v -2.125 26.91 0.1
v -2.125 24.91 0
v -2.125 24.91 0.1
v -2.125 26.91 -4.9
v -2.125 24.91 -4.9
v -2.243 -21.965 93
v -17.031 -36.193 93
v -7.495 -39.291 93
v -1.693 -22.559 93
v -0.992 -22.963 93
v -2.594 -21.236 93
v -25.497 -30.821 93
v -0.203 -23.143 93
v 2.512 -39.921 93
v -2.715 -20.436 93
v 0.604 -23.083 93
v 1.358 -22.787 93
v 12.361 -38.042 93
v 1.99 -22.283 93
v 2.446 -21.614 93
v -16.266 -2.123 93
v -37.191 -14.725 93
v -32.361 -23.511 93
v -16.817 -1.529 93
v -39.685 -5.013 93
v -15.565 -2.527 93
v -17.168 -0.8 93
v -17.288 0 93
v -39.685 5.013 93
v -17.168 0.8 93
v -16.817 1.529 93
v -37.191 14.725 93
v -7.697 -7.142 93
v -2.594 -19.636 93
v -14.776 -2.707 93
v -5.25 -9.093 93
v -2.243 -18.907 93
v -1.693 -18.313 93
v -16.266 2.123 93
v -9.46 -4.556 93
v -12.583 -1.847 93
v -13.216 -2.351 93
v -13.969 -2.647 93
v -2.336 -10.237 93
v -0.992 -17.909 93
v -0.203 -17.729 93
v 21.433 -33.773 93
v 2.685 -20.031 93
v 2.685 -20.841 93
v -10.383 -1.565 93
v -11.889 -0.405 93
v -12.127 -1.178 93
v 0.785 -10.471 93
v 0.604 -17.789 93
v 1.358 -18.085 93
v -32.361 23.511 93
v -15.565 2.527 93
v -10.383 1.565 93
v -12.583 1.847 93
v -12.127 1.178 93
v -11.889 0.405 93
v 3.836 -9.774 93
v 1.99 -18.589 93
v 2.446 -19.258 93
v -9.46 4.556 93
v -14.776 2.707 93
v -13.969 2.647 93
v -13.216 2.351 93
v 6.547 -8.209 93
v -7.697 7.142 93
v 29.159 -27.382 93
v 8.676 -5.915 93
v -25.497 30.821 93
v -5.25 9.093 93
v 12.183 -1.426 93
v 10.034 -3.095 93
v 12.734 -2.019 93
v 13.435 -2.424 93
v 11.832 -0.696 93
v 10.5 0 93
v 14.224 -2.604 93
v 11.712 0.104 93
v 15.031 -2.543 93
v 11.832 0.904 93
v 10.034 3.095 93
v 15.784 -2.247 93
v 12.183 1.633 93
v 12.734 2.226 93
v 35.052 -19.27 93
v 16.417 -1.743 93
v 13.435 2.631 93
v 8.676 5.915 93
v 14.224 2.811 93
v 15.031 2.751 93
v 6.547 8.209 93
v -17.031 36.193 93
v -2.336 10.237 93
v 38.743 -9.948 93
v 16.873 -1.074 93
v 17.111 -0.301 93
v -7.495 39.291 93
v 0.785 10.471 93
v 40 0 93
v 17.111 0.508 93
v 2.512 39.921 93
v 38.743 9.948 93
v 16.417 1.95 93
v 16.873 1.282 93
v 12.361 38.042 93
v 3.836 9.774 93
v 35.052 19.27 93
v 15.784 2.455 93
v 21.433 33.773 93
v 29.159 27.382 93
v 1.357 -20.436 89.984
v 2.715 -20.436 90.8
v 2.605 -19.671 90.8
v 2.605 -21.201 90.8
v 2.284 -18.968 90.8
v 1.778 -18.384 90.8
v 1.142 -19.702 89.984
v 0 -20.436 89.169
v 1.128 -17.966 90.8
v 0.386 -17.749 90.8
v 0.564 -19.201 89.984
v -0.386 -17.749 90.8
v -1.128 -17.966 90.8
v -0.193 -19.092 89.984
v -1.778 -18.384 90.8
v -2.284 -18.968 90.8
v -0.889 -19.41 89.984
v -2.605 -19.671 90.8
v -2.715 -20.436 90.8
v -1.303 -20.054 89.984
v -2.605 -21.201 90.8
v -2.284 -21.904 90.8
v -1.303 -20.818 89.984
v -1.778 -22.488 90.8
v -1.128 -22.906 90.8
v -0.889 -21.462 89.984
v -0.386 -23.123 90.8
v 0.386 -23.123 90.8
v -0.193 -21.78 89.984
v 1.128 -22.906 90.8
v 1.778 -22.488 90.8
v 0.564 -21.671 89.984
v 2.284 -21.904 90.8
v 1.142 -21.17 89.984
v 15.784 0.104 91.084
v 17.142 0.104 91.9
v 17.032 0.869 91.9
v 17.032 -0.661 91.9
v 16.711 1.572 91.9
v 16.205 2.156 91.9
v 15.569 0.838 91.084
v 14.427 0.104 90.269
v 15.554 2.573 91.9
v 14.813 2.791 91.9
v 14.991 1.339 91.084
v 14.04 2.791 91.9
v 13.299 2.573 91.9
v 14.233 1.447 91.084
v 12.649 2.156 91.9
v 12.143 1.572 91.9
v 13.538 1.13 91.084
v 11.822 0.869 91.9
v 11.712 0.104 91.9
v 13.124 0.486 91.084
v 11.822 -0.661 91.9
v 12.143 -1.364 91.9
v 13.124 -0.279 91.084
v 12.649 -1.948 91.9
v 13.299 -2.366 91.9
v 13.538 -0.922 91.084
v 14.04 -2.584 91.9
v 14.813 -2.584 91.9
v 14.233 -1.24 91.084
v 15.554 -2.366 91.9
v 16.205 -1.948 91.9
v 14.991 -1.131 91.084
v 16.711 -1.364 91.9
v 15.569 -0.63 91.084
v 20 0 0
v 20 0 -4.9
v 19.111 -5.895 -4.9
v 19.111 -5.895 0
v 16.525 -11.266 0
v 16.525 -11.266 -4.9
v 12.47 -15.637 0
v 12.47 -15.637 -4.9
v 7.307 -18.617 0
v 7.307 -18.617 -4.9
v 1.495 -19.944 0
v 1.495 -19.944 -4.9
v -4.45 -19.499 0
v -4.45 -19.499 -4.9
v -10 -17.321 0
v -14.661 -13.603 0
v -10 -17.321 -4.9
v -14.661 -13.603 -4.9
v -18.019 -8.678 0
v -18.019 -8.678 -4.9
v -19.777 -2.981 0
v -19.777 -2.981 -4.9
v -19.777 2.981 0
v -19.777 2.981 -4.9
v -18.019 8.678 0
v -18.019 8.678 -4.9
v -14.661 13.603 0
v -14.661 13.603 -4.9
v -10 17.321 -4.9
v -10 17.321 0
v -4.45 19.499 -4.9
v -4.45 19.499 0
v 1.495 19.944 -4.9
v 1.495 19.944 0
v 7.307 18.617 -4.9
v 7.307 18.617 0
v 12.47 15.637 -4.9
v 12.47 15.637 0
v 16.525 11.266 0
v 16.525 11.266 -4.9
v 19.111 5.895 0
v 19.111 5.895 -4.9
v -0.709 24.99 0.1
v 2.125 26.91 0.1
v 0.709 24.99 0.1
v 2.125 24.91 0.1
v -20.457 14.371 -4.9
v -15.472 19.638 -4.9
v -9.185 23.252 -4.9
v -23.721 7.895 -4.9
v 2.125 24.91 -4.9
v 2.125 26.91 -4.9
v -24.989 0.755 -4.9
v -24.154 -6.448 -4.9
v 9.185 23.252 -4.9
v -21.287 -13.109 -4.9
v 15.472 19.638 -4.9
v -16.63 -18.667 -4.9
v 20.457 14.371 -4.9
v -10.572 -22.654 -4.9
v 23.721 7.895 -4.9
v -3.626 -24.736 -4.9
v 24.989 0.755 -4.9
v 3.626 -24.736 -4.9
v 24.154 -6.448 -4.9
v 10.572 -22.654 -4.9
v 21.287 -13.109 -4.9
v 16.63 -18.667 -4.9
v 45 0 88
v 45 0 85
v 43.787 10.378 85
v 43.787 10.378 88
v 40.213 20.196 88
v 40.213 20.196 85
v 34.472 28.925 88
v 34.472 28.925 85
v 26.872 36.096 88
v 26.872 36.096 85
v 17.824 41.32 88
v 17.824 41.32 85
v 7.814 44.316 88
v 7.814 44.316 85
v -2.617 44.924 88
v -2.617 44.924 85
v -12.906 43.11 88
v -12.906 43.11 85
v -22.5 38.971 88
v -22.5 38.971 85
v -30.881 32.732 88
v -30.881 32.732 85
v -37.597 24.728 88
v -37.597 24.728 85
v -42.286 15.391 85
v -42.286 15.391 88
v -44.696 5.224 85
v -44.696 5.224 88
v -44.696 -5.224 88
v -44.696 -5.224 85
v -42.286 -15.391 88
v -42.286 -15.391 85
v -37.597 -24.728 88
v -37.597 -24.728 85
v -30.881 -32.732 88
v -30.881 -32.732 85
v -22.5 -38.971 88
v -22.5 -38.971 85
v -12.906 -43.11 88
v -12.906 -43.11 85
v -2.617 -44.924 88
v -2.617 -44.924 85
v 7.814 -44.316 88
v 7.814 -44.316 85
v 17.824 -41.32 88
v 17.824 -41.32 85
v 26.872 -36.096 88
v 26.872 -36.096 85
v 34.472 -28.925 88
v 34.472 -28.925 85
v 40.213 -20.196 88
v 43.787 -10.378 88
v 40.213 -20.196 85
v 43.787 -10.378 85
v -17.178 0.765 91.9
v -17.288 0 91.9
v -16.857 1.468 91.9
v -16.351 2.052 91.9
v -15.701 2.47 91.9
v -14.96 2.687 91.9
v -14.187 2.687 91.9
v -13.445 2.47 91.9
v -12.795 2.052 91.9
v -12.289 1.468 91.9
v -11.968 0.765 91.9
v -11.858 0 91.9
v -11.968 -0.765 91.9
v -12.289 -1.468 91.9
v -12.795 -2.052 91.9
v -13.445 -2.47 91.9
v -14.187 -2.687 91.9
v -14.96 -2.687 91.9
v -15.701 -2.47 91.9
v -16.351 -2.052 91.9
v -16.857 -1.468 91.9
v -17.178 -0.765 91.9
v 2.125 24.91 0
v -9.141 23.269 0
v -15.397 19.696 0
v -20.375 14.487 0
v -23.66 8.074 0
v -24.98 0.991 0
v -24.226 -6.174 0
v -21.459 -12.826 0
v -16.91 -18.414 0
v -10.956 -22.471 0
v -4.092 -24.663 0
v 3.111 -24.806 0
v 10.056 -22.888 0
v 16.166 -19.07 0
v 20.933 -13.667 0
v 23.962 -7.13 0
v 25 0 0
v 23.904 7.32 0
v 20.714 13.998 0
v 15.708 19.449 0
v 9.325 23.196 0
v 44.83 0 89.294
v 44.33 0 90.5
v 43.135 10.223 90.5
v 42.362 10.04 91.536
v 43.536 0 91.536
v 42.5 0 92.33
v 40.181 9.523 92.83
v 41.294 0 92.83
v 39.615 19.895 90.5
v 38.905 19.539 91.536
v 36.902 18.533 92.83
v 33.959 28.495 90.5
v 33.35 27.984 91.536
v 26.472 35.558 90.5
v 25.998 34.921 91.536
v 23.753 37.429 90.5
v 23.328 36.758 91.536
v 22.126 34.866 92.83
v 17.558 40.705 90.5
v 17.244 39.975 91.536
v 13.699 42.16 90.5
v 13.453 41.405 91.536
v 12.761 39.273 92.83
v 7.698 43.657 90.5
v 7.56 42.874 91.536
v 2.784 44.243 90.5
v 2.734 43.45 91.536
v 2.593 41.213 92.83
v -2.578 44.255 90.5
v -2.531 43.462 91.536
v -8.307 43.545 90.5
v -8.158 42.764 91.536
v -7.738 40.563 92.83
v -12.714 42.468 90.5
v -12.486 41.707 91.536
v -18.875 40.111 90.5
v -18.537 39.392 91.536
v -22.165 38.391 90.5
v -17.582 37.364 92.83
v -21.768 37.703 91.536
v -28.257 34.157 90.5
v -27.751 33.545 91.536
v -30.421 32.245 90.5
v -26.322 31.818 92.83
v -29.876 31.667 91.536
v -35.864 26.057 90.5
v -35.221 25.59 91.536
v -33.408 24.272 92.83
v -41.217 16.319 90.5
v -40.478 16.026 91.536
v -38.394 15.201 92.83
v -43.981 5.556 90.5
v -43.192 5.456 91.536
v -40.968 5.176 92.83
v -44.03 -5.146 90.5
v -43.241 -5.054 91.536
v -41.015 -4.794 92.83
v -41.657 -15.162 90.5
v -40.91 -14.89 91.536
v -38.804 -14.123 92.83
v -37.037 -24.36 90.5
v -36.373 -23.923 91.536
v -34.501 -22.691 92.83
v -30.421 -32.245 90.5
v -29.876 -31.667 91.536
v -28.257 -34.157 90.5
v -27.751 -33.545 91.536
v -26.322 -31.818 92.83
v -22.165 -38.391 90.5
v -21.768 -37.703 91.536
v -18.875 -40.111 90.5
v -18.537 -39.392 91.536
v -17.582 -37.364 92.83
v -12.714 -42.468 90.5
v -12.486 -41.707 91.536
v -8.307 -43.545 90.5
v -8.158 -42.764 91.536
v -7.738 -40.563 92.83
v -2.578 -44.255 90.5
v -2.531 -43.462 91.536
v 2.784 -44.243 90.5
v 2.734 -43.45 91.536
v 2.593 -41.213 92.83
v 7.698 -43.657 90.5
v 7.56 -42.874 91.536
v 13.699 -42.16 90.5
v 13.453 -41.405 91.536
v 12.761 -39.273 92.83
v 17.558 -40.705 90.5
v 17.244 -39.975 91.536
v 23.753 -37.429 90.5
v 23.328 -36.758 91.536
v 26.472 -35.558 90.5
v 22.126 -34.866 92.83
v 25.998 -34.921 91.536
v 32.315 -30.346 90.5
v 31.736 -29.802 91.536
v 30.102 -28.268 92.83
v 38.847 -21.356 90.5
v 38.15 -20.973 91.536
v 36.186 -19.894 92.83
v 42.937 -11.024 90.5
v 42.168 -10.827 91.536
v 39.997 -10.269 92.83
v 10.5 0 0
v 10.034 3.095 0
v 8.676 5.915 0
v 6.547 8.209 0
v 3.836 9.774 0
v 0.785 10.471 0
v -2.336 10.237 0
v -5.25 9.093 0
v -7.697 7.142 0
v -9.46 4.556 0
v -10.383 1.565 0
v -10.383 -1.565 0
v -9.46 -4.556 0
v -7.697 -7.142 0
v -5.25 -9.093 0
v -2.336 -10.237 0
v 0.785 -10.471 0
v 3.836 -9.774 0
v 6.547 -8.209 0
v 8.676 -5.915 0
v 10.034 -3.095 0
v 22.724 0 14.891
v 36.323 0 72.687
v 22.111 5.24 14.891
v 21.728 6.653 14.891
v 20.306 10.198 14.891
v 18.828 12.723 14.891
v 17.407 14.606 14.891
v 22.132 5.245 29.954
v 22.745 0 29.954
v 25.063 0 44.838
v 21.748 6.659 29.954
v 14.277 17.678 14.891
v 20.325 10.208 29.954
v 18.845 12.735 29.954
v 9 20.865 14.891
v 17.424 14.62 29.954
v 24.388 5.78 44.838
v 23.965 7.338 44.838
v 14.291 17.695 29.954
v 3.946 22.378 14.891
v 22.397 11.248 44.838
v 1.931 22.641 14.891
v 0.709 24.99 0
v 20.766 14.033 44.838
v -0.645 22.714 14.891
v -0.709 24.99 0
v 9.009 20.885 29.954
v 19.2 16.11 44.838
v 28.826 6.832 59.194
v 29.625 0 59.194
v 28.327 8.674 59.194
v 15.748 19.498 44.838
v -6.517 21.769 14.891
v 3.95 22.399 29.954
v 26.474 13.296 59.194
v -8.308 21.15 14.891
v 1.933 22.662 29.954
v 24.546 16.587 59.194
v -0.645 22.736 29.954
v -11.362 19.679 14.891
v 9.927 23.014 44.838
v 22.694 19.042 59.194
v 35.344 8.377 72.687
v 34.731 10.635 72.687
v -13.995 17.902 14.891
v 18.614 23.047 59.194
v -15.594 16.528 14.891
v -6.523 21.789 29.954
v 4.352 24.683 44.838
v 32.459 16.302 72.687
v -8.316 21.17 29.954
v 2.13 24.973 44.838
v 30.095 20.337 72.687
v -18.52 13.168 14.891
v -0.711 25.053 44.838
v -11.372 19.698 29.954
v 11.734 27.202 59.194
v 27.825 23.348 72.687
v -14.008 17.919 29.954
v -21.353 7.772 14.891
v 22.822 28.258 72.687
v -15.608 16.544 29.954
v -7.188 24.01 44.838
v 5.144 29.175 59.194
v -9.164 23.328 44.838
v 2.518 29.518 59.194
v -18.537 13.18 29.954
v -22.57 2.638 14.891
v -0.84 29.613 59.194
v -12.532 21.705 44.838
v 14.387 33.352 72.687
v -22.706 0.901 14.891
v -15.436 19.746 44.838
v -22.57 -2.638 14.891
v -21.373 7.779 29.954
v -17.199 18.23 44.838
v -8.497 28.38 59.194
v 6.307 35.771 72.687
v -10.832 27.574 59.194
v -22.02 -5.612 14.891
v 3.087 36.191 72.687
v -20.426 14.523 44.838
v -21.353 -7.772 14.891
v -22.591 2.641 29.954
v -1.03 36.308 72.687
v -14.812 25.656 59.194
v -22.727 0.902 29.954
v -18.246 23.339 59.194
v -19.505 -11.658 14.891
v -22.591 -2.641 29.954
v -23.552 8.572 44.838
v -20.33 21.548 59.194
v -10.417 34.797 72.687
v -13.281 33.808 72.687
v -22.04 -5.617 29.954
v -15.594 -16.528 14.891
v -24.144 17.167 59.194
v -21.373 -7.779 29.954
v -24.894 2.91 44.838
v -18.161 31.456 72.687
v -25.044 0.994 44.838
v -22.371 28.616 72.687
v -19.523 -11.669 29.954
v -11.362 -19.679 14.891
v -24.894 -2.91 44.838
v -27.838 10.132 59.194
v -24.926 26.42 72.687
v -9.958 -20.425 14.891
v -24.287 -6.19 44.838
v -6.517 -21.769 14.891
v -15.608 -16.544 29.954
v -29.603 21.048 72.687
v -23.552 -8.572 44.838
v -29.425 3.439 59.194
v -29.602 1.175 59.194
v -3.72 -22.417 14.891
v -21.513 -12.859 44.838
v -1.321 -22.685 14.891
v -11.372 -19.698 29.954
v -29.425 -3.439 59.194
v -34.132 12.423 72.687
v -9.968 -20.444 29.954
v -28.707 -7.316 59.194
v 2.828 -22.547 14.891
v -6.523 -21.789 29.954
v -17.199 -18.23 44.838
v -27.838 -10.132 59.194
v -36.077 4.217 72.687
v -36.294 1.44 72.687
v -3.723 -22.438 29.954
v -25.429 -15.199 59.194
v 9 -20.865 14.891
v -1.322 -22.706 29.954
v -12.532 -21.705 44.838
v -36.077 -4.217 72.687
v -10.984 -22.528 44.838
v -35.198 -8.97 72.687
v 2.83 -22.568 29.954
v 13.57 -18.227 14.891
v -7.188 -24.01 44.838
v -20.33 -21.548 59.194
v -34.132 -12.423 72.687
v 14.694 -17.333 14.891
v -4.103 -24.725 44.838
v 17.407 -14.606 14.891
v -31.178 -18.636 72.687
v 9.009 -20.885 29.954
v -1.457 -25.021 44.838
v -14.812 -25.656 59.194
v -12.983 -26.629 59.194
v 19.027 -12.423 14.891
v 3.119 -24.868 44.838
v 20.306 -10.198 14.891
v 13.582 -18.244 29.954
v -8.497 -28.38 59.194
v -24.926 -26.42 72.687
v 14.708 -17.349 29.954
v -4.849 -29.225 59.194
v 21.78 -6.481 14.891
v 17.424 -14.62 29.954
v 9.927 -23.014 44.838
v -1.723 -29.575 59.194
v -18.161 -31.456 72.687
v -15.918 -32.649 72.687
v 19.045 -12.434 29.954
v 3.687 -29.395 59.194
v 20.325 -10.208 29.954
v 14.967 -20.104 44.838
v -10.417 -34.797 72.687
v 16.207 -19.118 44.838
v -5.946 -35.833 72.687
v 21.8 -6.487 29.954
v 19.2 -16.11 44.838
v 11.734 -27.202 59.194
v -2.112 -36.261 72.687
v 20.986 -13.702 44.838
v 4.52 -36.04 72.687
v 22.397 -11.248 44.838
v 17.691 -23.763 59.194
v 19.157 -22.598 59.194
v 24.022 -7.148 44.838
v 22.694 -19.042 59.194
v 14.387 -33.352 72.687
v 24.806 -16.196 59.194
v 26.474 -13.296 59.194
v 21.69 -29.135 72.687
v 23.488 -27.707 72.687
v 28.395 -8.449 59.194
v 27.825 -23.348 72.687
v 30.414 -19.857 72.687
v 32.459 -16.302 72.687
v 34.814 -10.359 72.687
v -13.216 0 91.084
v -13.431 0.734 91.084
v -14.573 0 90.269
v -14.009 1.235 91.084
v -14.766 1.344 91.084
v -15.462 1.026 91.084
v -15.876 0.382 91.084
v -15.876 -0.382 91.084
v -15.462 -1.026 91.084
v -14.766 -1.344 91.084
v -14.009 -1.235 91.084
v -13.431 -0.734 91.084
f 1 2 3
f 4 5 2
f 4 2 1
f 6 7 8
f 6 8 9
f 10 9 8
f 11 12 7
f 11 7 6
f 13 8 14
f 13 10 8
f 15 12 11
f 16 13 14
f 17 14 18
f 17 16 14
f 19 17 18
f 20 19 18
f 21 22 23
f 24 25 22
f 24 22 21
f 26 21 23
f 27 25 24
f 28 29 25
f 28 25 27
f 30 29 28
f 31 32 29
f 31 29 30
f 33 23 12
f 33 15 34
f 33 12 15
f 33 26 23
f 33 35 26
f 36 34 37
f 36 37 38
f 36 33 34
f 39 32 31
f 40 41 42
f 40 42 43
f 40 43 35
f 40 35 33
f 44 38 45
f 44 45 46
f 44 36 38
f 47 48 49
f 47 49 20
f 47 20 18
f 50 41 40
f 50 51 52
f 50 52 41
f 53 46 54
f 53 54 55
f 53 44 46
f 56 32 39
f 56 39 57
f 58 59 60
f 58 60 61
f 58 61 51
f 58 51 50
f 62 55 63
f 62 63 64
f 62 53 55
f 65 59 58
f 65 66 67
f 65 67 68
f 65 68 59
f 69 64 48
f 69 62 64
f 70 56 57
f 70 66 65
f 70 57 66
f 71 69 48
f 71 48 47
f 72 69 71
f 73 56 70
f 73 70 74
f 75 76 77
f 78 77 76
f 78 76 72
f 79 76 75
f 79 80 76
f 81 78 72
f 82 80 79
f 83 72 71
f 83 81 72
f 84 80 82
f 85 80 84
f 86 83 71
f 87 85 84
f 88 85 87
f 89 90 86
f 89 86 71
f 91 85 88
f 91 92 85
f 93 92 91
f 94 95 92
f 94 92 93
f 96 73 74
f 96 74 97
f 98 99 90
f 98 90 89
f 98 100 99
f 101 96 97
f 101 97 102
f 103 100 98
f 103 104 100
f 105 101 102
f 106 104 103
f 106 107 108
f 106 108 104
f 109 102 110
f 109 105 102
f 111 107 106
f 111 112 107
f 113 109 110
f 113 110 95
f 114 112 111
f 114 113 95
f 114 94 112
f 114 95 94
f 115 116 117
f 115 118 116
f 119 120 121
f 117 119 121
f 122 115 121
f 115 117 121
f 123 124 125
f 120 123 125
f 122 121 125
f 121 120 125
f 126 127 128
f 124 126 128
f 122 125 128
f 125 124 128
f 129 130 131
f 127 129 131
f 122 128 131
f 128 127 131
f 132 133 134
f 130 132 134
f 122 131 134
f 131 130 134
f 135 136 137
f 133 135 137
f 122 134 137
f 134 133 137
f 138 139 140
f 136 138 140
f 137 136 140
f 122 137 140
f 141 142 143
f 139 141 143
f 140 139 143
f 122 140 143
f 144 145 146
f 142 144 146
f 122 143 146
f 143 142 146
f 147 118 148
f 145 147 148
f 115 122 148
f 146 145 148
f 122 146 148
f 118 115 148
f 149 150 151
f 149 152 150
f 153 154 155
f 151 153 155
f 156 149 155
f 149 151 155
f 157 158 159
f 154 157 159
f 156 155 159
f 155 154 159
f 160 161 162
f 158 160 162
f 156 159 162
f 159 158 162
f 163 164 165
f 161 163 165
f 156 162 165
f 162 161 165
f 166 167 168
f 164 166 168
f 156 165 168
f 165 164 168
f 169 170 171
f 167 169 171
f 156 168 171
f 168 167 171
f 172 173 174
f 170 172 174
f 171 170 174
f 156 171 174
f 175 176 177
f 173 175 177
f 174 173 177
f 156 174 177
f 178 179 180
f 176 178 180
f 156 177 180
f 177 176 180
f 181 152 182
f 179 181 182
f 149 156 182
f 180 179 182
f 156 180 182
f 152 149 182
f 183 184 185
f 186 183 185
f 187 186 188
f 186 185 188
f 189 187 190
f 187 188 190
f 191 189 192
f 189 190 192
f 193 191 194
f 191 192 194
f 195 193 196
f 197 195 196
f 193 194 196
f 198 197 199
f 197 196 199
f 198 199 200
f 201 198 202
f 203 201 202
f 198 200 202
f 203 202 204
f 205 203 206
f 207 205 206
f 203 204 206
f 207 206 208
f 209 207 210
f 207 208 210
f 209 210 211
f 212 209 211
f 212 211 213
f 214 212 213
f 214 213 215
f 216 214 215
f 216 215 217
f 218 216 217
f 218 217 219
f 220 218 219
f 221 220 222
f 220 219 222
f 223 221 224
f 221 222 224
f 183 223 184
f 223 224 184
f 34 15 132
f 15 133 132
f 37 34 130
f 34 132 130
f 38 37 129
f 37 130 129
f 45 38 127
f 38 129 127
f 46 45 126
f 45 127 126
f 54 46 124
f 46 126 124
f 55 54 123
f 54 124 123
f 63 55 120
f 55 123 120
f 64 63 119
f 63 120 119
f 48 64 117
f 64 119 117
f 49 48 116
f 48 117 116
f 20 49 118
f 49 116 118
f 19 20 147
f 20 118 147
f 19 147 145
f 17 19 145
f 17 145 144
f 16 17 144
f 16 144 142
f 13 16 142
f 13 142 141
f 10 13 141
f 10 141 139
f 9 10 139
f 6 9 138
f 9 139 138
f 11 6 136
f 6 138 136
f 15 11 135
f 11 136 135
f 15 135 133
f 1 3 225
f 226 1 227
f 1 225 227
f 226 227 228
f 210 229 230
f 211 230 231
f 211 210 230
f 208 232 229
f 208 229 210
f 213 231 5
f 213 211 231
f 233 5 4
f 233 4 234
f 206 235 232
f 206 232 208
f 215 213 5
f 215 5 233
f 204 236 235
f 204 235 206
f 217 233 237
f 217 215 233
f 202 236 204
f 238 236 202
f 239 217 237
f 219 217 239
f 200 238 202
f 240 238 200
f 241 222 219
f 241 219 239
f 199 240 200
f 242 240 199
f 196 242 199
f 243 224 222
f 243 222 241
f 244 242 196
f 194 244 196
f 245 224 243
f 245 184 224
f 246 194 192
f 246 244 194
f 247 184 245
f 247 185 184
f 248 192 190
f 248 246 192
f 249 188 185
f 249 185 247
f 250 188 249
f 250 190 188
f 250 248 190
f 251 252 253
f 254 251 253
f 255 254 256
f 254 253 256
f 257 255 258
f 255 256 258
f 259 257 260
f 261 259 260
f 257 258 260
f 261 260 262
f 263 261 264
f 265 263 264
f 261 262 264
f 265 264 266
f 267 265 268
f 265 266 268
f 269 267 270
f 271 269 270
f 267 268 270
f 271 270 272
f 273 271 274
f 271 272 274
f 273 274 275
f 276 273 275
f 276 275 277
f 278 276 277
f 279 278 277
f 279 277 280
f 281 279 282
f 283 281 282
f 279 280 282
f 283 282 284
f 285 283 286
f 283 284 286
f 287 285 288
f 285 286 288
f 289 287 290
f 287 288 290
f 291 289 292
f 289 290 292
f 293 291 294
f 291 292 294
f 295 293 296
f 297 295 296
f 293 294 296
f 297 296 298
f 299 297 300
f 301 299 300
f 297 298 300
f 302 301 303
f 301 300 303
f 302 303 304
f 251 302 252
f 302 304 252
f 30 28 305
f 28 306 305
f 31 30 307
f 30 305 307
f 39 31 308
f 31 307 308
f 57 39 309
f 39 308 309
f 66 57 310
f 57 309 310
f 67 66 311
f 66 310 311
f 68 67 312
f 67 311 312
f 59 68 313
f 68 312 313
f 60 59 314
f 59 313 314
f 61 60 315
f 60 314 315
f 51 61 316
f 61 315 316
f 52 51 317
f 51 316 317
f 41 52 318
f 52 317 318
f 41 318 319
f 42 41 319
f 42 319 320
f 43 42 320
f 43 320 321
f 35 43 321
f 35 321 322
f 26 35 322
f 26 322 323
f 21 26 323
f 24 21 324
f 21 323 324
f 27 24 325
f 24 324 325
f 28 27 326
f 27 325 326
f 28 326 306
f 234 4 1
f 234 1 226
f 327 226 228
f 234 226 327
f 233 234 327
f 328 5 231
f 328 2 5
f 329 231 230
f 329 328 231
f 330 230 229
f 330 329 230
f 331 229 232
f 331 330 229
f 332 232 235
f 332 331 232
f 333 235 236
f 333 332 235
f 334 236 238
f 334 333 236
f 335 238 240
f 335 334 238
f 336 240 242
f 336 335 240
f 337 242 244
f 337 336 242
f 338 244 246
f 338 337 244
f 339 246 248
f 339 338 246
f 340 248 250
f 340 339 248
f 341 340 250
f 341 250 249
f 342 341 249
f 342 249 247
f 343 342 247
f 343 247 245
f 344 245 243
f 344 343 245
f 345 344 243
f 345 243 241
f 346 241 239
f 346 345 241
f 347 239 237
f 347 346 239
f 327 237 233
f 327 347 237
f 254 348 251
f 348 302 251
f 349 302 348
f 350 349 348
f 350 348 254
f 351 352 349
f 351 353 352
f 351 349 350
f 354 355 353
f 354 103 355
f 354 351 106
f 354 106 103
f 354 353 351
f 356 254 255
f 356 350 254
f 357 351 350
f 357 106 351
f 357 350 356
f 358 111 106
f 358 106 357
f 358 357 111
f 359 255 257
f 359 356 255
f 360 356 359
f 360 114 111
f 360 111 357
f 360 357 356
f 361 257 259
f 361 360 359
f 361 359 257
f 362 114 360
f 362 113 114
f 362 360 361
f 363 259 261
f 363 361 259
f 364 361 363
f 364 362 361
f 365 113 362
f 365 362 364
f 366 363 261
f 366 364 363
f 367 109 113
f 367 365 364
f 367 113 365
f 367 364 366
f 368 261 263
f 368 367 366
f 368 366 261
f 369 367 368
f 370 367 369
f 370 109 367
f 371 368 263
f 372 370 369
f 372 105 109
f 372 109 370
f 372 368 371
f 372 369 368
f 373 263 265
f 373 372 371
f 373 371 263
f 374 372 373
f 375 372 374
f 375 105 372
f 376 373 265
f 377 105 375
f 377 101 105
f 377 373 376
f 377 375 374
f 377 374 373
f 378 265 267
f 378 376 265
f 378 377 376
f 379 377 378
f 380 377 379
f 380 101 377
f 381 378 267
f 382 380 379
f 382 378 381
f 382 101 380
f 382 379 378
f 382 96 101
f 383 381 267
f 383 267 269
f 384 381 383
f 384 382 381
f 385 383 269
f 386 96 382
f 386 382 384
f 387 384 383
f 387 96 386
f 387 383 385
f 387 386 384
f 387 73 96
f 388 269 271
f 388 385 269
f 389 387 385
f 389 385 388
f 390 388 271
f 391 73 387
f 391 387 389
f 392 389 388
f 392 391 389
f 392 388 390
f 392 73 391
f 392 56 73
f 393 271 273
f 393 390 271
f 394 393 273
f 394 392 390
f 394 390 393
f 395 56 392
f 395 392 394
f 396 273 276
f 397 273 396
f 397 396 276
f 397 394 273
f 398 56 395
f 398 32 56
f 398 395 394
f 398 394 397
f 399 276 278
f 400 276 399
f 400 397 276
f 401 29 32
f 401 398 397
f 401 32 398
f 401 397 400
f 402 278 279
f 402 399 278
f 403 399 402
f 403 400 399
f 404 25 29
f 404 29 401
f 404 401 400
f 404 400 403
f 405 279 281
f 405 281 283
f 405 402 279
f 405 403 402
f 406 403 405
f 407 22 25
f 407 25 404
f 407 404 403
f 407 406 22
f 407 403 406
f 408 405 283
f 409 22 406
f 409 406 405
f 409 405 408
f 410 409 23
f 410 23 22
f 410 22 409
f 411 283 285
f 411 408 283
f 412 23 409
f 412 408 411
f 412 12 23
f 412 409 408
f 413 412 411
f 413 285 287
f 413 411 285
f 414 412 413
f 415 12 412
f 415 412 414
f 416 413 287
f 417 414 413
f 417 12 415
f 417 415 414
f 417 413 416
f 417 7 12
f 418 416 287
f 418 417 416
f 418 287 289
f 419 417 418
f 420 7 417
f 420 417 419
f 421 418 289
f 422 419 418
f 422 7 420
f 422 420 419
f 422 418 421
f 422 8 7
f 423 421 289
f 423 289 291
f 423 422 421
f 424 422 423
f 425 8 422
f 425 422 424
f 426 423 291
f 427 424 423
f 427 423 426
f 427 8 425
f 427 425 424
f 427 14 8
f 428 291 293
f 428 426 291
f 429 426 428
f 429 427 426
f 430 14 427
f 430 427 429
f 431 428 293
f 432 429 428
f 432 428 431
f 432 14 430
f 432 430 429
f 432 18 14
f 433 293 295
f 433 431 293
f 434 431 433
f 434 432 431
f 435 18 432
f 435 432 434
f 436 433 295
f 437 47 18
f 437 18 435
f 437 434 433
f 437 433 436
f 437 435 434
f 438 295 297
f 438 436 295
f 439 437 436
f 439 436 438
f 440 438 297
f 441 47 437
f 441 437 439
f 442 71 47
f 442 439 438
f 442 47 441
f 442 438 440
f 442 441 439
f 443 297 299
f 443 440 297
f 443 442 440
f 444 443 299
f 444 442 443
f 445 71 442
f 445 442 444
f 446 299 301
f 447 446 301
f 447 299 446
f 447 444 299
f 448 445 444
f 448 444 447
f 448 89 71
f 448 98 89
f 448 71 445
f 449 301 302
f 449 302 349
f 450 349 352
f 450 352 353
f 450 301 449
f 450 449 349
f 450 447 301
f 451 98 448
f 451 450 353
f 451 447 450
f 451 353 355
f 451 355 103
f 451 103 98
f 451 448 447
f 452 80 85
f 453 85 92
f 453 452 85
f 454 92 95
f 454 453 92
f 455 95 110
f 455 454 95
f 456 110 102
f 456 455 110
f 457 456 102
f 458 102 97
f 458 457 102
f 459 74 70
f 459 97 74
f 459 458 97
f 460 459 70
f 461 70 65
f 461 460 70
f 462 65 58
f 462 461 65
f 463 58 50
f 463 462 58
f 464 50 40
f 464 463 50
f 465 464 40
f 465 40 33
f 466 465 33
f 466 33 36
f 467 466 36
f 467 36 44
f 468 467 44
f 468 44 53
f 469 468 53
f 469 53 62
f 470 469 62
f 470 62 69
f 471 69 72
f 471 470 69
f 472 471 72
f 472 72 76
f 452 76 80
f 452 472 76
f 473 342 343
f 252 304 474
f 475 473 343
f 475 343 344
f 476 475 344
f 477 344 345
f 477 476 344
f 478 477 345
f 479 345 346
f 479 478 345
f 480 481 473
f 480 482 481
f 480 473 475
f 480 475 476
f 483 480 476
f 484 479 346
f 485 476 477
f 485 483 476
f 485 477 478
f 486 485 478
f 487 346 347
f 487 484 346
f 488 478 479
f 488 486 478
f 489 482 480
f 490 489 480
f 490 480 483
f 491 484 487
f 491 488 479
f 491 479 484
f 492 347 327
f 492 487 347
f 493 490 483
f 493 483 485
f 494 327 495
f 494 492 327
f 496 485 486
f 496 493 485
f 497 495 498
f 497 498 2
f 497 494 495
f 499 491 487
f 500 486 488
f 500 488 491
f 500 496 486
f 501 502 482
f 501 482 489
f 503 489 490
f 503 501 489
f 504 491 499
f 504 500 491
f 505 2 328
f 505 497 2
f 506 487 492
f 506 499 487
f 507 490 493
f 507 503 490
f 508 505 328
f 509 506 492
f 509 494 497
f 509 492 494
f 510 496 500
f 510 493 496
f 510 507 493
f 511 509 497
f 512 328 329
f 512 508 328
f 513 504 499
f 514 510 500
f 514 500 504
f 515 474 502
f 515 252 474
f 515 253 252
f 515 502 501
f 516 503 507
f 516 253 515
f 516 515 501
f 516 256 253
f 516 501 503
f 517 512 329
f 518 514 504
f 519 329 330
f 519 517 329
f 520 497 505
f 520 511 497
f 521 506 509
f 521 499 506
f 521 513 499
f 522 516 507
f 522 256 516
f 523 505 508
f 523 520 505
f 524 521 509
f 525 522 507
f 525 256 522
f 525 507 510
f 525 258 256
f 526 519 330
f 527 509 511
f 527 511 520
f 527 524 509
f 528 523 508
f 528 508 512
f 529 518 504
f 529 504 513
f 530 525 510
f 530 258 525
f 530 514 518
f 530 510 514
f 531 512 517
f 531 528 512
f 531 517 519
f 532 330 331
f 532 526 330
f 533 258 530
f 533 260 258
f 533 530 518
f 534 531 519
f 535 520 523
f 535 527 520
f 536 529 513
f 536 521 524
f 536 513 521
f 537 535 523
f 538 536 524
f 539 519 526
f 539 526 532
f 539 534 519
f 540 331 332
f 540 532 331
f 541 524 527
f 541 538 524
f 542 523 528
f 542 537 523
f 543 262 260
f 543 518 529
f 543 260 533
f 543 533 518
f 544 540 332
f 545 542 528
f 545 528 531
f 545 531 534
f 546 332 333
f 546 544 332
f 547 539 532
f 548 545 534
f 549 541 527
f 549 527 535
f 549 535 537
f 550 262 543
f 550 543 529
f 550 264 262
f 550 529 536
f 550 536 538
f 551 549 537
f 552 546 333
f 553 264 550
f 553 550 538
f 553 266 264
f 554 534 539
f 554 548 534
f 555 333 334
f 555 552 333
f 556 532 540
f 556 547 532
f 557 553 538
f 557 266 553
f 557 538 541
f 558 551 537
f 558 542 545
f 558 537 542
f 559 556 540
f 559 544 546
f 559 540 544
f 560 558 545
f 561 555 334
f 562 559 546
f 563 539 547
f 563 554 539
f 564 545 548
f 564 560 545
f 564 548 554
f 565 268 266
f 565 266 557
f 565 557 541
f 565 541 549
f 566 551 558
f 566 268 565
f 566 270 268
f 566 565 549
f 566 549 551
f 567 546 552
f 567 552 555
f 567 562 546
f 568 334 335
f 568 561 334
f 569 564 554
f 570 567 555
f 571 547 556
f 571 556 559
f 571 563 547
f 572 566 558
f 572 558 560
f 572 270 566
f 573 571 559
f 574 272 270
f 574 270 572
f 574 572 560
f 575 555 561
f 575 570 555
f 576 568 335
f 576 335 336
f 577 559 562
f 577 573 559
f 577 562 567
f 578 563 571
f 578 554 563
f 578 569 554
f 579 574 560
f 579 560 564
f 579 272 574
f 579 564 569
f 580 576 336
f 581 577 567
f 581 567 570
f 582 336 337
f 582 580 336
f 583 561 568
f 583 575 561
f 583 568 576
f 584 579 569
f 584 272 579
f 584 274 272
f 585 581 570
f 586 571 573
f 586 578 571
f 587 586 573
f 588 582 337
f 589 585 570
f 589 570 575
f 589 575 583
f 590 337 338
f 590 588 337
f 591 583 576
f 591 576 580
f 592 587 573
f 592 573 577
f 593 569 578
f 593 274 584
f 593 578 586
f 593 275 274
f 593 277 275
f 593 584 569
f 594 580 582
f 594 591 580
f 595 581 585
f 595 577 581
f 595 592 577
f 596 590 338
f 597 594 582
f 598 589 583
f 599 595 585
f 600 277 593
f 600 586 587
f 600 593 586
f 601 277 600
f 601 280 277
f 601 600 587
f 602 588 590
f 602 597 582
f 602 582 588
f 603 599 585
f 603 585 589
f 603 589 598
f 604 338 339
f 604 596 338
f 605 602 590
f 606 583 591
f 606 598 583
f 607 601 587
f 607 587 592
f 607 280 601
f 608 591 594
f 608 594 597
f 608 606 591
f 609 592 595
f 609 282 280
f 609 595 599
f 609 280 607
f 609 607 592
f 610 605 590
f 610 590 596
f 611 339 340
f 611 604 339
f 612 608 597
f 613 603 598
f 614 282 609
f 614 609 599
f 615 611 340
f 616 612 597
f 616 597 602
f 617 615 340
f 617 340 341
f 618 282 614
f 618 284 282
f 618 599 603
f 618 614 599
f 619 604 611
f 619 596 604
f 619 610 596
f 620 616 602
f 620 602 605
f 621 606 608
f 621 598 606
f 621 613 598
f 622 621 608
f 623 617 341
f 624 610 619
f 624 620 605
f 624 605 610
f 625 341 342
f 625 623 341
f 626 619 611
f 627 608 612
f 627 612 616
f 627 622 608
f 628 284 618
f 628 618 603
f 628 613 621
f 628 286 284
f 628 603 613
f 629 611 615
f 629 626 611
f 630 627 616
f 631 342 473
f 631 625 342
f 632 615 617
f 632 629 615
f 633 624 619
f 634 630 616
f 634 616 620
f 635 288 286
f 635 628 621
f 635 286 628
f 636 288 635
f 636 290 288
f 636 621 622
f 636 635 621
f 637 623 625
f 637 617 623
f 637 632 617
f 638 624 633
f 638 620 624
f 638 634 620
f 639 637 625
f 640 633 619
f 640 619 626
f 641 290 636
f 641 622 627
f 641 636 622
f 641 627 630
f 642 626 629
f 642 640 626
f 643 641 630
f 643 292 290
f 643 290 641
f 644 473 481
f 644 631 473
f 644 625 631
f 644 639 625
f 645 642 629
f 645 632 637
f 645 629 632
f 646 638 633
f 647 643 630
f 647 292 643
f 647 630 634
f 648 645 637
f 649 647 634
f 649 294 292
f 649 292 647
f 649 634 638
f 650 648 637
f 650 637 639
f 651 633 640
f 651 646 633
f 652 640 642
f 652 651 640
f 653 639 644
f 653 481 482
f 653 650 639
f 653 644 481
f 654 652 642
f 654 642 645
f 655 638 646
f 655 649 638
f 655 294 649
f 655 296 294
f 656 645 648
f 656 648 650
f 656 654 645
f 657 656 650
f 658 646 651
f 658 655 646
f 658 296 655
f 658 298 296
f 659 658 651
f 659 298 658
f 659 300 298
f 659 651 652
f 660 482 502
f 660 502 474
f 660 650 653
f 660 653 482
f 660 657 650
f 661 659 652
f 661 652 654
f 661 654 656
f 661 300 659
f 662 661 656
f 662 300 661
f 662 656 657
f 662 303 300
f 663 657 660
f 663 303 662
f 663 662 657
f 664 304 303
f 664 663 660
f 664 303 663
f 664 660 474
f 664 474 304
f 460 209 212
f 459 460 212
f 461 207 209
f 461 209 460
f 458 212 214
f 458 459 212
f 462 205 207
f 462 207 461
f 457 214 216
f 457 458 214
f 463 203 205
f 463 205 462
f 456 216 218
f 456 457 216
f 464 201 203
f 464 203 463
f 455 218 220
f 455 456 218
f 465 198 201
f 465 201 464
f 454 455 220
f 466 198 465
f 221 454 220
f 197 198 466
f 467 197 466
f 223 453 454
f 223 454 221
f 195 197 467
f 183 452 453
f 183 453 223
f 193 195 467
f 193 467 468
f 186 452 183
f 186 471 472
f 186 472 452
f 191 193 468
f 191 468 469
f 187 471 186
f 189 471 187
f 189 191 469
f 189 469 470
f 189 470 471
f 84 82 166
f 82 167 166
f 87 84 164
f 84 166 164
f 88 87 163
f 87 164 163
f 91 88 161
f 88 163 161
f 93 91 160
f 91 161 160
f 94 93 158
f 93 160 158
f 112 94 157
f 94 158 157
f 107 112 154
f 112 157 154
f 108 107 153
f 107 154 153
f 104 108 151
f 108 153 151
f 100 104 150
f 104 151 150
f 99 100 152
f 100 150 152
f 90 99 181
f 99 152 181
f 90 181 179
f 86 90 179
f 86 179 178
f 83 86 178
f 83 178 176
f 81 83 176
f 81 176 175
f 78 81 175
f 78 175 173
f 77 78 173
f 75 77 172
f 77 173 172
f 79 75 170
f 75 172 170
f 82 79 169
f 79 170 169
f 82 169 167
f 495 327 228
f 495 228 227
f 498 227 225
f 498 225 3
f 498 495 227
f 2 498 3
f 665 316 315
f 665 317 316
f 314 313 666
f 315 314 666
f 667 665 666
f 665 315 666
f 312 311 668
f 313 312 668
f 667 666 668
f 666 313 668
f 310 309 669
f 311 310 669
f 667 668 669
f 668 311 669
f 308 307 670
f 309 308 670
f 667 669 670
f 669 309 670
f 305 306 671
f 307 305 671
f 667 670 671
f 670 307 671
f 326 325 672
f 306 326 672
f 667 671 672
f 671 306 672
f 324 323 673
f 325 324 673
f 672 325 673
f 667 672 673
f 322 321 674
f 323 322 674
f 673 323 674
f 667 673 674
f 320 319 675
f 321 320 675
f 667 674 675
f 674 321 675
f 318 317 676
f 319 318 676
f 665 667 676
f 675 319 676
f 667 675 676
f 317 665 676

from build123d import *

# Parameters (mm, degrees)
F3_DEPTH  = 4.9
F4_R      = 20
F4_R_2    = 4
F5_DEPTH  = 4.9
F6_DEPTH  = 8
F7_R      = 5
F9_D      = 5.43
F9_DEPTH  = 1.1
F9_TIP    = 1.6313365807
F10_D     = 5.43
F10_DEPTH = 2.2
F10_TIP   = 1.6313365807
F11_R     = 10.5
F12_DEPTH = 100
F14_DEPTH = 5


with BuildPart() as f2:
    # F0 (on Front) → F2 (revolve)
    with BuildSketch(Plane.XZ):
        with BuildLine():
            Line((4, 0), (25, 0))
            ThreePointArc((25, 0), (25.0633115181, 44.8380443487), (45, 85))
            Line((45, 85), (10, 85))
            ThreePointArc((10, 85), (5.5209994492, 72.8549601322), (4, 60))
            Line((4, 60), (4, 0))
        make_face()
    revolve(axis=Axis((0, 0, 25.1682717353), (0, 0, 1)))

    # F3 (add): a face of the model
    f3_faces = [f2.faces().sort_by_distance(p)[0] for p in [
        (-4.7071067812, 0, 0),
    ]]
    extrude(f3_faces, amount=F3_DEPTH)

    # F4 (on face) → F5 (cut)
    with BuildSketch(Plane(origin=(0, 0, -4.9), x_dir=(1, 0, 0), z_dir=(0, 0, -1))):
        Circle(F4_R)
        Circle(F4_R_2, mode=Mode.SUBTRACT)
    extrude(amount=-F5_DEPTH, mode=Mode.SUBTRACT)

    # F6 (add): a face of the model
    f6_faces = [f2.faces().sort_by_distance(p)[0] for p in [
        (-43.7272077939, 0, 85),
    ]]
    extrude(f6_faces, amount=F6_DEPTH)

    # F7
    f7_edges = [f2.edges().sort_by_distance(p)[0] for p in [
        (-45, 0, 93),
    ]]
    fillet(f7_edges, radius=F7_R)

    # F9
    with Locations(Plane.XY.offset(93)):
        with Locations((14.426644952, 0.1037907432), (-14.573297048, 0)):
            Hole(F9_D / 2, depth=F9_DEPTH)
            with Locations((0, 0, -(F9_DEPTH + F9_TIP / 2))):  # 118° drill point
                Cone(0, F9_D / 2, F9_TIP, mode=Mode.SUBTRACT)

    # F10
    with Locations(Plane.XY.offset(93)):
        with Locations((0, -20.4359735063)):
            Hole(F10_D / 2, depth=F10_DEPTH)
            with Locations((0, 0, -(F10_DEPTH + F10_TIP / 2))):  # 118° drill point
                Cone(0, F10_D / 2, F10_TIP, mode=Mode.SUBTRACT)

    # F11 (on Top) → F12 (cut)
    with BuildSketch(Plane.XY):
        Circle(F11_R)
    extrude(amount=F12_DEPTH, mode=Mode.SUBTRACT)

    # F13 (on face) → F14 (join)
    with BuildSketch(Plane(origin=(0, 0, -4.9), x_dir=(1, 0, 0), z_dir=(0, 0, -1))):
        with BuildLine():
            ThreePointArc((2.125, -24.9095237811), (0, -25), (-2.125, -24.9095237811))
            Line((-2.125, -24.9095237811), (-2.125, -26.9095237811))
            Line((-2.125, -26.9095237811), (2.125, -26.9095237811))
            Line((2.125, -26.9095237811), (2.125, -24.9095237811))
        make_face()
    extrude(amount=-F14_DEPTH)


solid = f2.part
